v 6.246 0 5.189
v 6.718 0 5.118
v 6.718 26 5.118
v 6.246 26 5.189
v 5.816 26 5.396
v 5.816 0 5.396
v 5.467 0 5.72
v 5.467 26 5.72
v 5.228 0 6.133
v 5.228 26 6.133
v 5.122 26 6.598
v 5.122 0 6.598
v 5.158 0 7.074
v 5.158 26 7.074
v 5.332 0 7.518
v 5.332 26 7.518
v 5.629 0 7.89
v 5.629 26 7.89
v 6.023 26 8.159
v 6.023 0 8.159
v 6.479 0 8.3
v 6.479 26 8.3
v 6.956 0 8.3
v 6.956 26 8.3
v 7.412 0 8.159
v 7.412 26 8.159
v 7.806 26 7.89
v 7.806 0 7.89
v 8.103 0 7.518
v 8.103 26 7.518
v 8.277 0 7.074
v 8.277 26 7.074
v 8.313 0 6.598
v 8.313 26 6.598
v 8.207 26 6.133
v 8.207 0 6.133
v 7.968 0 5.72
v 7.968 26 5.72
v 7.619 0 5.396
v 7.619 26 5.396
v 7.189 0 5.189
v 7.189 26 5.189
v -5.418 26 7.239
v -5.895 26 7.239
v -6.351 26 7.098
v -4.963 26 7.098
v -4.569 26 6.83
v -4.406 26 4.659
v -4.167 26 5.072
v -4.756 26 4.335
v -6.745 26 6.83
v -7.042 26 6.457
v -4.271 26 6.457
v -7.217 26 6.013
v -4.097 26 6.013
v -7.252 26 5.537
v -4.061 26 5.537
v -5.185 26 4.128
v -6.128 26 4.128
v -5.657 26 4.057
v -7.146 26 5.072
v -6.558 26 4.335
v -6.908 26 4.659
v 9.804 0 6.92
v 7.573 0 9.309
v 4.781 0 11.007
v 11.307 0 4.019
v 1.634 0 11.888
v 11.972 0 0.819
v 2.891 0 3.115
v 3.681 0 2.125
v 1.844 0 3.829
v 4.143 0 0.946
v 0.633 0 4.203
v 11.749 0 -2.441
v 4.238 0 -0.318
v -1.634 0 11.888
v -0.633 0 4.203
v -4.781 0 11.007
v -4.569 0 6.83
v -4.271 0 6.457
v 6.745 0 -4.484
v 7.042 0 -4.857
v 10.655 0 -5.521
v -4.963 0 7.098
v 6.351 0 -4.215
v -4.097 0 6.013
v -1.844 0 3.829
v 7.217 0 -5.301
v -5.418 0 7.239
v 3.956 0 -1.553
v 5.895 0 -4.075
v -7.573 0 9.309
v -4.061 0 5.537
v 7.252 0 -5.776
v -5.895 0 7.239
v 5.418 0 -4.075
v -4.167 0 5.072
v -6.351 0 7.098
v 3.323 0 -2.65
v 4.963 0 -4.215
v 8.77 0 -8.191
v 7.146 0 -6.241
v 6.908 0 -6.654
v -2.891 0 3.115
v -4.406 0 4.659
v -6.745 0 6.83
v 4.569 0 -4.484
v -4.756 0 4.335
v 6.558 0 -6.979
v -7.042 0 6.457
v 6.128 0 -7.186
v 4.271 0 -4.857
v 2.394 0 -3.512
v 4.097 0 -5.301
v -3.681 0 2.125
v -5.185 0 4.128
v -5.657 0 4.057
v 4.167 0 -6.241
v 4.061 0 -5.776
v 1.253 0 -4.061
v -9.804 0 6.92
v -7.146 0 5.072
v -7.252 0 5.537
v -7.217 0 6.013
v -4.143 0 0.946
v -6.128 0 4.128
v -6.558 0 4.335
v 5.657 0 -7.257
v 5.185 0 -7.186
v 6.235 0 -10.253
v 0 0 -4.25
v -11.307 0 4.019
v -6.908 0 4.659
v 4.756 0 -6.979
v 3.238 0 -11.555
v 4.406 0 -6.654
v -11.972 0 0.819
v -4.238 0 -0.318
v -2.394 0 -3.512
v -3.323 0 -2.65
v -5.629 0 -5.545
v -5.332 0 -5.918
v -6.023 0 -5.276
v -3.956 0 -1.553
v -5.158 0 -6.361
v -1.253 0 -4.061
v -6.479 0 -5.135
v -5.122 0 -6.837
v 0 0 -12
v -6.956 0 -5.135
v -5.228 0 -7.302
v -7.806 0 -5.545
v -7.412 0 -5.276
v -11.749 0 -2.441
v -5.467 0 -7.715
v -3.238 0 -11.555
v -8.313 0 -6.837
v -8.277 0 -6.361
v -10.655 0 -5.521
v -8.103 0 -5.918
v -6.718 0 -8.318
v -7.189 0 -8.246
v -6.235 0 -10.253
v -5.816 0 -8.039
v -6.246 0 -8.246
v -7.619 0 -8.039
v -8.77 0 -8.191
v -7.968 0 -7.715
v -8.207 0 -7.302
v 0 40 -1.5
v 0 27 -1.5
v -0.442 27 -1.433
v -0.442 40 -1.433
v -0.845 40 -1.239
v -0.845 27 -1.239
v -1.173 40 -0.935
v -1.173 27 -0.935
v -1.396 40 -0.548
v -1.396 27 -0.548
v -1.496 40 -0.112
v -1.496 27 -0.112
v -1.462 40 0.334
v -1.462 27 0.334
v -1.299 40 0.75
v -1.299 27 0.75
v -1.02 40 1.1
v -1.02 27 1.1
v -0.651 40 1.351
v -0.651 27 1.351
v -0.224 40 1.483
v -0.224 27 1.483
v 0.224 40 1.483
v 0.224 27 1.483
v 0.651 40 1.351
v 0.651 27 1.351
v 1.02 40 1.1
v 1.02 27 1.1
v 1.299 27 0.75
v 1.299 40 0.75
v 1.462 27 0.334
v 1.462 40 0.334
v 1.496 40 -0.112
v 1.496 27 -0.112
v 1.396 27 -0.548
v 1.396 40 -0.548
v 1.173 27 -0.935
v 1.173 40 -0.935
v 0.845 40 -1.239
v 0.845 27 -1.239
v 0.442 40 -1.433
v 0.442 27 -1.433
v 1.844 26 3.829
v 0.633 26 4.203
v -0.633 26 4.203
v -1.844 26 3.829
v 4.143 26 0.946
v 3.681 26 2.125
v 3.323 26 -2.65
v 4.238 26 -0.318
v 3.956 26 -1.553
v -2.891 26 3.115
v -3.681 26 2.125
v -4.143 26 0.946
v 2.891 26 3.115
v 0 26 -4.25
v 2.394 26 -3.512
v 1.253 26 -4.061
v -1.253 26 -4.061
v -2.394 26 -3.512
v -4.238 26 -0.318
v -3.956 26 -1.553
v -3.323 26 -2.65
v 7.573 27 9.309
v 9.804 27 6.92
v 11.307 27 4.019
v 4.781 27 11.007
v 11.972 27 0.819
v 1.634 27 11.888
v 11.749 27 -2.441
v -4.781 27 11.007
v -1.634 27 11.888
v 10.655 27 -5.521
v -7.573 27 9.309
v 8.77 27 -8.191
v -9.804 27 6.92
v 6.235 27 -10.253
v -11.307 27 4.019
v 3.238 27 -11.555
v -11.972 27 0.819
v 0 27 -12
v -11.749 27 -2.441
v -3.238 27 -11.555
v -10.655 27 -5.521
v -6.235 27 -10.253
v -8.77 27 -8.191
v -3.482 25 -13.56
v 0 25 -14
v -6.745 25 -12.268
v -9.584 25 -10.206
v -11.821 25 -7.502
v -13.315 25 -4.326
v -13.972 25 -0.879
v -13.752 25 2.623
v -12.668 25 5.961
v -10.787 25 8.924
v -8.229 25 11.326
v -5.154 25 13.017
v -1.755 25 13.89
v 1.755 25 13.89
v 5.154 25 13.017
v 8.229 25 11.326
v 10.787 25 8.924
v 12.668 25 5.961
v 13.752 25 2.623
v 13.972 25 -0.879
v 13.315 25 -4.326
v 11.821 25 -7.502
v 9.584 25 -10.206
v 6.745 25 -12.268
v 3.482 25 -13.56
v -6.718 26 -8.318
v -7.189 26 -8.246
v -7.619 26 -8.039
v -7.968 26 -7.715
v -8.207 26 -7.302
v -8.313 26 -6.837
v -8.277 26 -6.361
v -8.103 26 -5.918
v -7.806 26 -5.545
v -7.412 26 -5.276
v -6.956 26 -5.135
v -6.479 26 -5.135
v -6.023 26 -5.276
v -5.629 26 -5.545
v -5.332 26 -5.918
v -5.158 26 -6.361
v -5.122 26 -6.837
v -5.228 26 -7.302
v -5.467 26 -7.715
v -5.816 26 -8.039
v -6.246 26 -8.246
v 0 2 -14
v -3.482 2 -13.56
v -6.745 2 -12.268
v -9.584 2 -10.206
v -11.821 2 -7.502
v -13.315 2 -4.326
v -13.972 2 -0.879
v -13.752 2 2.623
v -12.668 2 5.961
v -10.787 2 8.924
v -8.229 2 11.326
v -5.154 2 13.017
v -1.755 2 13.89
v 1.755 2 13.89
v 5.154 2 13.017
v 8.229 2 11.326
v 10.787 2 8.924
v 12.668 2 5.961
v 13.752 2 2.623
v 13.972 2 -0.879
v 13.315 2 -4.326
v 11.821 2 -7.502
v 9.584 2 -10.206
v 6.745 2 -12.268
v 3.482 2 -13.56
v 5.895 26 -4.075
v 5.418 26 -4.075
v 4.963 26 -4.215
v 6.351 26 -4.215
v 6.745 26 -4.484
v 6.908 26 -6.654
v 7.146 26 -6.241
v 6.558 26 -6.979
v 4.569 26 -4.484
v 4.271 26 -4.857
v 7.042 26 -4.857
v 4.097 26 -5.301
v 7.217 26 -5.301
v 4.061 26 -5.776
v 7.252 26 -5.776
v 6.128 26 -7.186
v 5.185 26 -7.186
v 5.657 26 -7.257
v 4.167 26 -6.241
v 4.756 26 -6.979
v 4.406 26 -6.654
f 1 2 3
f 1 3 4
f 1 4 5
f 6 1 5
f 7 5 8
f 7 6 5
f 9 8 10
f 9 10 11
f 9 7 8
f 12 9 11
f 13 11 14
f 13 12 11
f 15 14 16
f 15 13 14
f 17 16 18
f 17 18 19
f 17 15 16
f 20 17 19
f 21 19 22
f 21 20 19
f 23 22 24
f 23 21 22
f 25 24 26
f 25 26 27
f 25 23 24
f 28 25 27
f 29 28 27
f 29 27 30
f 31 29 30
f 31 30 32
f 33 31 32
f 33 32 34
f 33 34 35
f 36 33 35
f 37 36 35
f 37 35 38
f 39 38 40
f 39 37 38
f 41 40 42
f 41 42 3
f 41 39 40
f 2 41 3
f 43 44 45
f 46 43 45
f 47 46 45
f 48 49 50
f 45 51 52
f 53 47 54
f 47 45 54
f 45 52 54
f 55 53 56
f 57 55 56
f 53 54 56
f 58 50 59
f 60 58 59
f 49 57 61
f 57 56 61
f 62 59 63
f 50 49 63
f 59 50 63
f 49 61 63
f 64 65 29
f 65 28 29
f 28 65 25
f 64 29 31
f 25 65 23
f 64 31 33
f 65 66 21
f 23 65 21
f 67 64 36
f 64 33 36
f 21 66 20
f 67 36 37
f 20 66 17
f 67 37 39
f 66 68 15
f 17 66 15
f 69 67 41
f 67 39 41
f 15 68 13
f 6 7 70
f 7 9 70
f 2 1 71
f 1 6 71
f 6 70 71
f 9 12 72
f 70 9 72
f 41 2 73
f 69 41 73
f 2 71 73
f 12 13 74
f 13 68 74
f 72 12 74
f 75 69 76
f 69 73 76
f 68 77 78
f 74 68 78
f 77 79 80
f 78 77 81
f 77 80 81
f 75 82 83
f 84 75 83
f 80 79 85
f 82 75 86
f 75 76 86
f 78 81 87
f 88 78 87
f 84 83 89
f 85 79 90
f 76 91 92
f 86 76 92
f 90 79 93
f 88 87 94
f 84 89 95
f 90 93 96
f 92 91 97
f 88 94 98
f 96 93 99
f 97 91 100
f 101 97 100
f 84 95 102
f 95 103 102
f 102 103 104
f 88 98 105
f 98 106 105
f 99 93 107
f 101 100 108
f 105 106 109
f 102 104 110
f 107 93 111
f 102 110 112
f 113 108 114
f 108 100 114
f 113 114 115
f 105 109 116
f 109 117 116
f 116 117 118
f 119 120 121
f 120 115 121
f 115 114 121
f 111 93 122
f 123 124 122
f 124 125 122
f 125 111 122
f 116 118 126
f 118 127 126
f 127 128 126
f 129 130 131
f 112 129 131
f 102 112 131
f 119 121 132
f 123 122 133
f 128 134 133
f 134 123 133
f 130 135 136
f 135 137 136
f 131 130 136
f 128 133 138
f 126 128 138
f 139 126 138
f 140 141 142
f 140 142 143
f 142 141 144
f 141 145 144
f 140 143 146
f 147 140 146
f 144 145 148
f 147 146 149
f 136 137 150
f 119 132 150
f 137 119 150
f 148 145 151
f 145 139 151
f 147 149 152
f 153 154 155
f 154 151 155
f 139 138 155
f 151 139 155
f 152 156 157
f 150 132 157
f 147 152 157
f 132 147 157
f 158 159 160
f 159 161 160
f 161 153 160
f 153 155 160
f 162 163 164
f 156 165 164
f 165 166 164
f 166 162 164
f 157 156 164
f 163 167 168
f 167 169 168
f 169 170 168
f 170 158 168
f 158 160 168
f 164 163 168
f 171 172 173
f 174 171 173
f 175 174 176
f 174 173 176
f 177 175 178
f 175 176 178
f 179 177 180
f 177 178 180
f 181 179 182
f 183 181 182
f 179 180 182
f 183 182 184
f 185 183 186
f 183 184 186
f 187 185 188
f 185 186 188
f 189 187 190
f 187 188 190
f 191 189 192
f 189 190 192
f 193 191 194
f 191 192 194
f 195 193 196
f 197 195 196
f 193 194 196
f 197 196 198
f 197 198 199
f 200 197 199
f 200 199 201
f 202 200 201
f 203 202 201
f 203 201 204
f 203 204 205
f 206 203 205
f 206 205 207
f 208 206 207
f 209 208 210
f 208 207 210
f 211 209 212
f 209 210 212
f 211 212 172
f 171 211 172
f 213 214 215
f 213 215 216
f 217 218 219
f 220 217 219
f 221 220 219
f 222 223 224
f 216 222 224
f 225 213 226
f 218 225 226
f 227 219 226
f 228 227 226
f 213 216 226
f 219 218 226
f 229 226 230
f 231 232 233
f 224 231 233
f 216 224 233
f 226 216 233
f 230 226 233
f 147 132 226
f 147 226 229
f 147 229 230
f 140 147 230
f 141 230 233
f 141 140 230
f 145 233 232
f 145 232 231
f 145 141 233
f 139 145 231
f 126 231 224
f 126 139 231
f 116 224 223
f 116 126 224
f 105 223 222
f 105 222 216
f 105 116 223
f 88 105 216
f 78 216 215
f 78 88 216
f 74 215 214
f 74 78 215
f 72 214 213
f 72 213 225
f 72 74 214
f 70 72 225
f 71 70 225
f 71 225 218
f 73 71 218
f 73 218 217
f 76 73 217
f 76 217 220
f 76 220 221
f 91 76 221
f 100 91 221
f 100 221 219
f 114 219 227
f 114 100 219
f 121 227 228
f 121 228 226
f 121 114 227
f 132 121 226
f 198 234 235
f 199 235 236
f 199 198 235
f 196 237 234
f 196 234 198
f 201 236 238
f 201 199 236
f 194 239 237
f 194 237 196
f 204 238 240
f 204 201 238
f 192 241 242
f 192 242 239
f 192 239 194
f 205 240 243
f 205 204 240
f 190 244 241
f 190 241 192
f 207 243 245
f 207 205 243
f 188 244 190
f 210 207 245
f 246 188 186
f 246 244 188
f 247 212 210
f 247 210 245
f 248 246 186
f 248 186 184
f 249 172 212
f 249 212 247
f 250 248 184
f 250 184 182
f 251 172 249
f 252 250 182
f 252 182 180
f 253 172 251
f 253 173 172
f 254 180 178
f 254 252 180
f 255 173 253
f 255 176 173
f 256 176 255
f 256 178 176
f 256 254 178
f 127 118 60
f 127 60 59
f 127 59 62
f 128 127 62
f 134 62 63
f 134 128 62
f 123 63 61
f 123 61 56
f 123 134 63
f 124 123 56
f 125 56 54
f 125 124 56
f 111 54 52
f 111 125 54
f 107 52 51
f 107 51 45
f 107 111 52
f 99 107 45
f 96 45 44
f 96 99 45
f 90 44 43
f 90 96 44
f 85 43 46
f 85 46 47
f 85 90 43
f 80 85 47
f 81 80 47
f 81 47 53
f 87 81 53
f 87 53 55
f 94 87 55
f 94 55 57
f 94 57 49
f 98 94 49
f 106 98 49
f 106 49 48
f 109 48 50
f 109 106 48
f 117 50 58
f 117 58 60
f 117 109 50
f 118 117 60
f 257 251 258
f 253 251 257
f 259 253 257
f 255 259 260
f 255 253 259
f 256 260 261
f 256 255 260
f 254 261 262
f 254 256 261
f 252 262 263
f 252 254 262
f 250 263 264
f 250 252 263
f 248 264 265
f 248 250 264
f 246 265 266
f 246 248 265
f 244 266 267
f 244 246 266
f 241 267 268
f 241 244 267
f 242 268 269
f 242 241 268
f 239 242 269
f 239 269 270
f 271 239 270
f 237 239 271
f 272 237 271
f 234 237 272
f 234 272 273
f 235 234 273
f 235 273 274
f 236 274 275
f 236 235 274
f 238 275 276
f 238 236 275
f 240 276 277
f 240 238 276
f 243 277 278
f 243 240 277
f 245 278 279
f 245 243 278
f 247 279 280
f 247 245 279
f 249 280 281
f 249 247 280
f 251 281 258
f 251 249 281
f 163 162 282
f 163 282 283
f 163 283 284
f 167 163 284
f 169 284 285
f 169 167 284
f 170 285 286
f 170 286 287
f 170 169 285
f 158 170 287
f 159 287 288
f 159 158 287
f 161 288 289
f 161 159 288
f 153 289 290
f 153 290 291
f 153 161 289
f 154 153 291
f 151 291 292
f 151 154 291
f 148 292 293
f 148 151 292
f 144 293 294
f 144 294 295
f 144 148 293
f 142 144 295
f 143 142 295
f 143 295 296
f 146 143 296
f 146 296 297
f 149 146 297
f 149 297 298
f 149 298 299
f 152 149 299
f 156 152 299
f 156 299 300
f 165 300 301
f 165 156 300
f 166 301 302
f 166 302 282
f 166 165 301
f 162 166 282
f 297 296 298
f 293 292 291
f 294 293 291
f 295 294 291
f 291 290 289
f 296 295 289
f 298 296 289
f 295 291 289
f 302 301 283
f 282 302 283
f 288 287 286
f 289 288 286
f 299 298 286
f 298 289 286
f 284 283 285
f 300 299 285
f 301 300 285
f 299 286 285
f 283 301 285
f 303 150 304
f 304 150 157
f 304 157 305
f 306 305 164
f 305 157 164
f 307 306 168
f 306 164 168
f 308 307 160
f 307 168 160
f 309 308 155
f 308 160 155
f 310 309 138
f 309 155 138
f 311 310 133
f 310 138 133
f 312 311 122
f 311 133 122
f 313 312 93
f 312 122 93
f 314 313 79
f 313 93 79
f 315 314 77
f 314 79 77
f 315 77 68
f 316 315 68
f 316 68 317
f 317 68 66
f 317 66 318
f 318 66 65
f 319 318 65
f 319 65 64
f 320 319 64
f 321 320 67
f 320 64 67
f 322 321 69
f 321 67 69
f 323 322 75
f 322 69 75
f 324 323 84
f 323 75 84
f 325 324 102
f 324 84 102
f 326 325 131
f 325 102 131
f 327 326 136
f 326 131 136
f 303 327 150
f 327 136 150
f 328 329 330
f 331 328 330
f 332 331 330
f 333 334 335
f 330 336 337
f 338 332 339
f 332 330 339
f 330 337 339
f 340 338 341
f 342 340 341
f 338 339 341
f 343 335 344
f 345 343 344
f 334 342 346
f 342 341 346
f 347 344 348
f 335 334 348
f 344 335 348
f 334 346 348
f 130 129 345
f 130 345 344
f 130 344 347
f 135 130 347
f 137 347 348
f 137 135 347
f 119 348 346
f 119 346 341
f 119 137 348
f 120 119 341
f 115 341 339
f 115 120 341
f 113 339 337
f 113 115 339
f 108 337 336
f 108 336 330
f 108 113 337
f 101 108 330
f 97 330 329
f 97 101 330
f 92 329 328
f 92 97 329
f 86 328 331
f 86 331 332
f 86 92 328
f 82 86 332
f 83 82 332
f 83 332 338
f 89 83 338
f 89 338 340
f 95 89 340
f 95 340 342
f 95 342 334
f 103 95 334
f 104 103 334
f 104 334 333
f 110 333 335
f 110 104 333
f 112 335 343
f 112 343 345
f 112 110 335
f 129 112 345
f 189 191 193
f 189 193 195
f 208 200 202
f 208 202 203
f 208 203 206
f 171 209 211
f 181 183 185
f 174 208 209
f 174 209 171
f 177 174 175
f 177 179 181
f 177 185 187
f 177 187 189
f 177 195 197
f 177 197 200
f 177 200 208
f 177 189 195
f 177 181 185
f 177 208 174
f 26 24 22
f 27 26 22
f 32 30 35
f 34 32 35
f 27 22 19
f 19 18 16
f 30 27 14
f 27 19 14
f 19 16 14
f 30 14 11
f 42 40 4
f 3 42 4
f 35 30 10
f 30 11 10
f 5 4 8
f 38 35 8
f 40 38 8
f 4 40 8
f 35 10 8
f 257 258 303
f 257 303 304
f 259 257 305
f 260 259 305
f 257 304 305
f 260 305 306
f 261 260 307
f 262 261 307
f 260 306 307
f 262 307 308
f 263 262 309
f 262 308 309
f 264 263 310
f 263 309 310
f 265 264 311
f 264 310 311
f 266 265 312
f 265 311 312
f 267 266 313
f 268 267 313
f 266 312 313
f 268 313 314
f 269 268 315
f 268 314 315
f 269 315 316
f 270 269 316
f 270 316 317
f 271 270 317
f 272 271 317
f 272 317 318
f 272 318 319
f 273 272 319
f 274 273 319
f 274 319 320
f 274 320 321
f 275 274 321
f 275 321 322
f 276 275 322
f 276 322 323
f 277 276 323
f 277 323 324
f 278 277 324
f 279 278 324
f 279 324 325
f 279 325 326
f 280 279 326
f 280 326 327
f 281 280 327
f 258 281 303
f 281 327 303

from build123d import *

# Parameters (mm, degrees)
SKETCH1_R           = 14
SKETCH1_R_2         = 1.6
SKETCH1_R_3         = 4.25
BOSS_EXTRUDE1_DEPTH = 26
CHAMFER1_SIZE       = 2
SKETCH2_R           = 14
BOSS_EXTRUDE2_DEPTH = 1
CHAMFER2_SIZE       = 2
SKETCH4_R           = 1.5
BOSS_EXTRUDE3_DEPTH = 13


with BuildPart() as part:
    # Sketch1 → Boss-Extrude1 (new body)
    with BuildSketch(Plane(origin=(0, 0, 0), x_dir=(1, 0, 0), z_dir=(0, 1, 0))):
        with Locations(Location((0, 0, 0), (0, 0, 90))):
            Circle(SKETCH1_R)
        with Locations(Location((-6.717514421, 6.717514421, 0), (0, 0, 90))):
            Circle(SKETCH1_R_2, mode=Mode.SUBTRACT)
        with Locations(Location((5.656854249, 5.656854249, 0), (0, 0, 90))):
            Circle(SKETCH1_R_2, mode=Mode.SUBTRACT)
        with Locations(Location((0, 0, 0), (0, 0, 90))):
            Circle(SKETCH1_R_3, mode=Mode.SUBTRACT)
        with Locations(Location((6.717514421, -6.717514421, 0), (0, 0, 90))):
            Circle(SKETCH1_R_2, mode=Mode.SUBTRACT)
        with Locations(Location((-5.656854249, -5.656854249, 0), (0, 0, 90))):
            Circle(SKETCH1_R_2, mode=Mode.SUBTRACT)
    extrude(amount=BOSS_EXTRUDE1_DEPTH)

    # Chamfer1
    chamfer1_edges = [part.edges().sort_by_distance(p)[0] for p in [
        (0, 0, 14),
    ]]
    chamfer(chamfer1_edges, length=CHAMFER1_SIZE)

    # Sketch2 → Boss-Extrude2 (add)
    with BuildSketch(Plane(origin=(0, 26, 0), x_dir=(1, 0, 0), z_dir=(0, 1, 0))):
        with Locations(Location((0, 0, 0), (0, 0, 90))):
            Circle(SKETCH2_R)
    extrude(amount=BOSS_EXTRUDE2_DEPTH)

    # Chamfer2
    chamfer2_edges = [part.edges().sort_by_distance(p)[0] for p in [
        (0, 27, 14),
    ]]
    chamfer(chamfer2_edges, length=CHAMFER2_SIZE)

    # Sketch4 → Boss-Extrude3 (add)
    with BuildSketch(Plane(origin=(0, 27, 0), x_dir=(1, 0, 0), z_dir=(0, 1, 0))):
        with Locations(Location((0, 0, 0), (0, 0, 90))):
            Circle(SKETCH4_R)
    extrude(amount=BOSS_EXTRUDE3_DEPTH)


solid = part.part
